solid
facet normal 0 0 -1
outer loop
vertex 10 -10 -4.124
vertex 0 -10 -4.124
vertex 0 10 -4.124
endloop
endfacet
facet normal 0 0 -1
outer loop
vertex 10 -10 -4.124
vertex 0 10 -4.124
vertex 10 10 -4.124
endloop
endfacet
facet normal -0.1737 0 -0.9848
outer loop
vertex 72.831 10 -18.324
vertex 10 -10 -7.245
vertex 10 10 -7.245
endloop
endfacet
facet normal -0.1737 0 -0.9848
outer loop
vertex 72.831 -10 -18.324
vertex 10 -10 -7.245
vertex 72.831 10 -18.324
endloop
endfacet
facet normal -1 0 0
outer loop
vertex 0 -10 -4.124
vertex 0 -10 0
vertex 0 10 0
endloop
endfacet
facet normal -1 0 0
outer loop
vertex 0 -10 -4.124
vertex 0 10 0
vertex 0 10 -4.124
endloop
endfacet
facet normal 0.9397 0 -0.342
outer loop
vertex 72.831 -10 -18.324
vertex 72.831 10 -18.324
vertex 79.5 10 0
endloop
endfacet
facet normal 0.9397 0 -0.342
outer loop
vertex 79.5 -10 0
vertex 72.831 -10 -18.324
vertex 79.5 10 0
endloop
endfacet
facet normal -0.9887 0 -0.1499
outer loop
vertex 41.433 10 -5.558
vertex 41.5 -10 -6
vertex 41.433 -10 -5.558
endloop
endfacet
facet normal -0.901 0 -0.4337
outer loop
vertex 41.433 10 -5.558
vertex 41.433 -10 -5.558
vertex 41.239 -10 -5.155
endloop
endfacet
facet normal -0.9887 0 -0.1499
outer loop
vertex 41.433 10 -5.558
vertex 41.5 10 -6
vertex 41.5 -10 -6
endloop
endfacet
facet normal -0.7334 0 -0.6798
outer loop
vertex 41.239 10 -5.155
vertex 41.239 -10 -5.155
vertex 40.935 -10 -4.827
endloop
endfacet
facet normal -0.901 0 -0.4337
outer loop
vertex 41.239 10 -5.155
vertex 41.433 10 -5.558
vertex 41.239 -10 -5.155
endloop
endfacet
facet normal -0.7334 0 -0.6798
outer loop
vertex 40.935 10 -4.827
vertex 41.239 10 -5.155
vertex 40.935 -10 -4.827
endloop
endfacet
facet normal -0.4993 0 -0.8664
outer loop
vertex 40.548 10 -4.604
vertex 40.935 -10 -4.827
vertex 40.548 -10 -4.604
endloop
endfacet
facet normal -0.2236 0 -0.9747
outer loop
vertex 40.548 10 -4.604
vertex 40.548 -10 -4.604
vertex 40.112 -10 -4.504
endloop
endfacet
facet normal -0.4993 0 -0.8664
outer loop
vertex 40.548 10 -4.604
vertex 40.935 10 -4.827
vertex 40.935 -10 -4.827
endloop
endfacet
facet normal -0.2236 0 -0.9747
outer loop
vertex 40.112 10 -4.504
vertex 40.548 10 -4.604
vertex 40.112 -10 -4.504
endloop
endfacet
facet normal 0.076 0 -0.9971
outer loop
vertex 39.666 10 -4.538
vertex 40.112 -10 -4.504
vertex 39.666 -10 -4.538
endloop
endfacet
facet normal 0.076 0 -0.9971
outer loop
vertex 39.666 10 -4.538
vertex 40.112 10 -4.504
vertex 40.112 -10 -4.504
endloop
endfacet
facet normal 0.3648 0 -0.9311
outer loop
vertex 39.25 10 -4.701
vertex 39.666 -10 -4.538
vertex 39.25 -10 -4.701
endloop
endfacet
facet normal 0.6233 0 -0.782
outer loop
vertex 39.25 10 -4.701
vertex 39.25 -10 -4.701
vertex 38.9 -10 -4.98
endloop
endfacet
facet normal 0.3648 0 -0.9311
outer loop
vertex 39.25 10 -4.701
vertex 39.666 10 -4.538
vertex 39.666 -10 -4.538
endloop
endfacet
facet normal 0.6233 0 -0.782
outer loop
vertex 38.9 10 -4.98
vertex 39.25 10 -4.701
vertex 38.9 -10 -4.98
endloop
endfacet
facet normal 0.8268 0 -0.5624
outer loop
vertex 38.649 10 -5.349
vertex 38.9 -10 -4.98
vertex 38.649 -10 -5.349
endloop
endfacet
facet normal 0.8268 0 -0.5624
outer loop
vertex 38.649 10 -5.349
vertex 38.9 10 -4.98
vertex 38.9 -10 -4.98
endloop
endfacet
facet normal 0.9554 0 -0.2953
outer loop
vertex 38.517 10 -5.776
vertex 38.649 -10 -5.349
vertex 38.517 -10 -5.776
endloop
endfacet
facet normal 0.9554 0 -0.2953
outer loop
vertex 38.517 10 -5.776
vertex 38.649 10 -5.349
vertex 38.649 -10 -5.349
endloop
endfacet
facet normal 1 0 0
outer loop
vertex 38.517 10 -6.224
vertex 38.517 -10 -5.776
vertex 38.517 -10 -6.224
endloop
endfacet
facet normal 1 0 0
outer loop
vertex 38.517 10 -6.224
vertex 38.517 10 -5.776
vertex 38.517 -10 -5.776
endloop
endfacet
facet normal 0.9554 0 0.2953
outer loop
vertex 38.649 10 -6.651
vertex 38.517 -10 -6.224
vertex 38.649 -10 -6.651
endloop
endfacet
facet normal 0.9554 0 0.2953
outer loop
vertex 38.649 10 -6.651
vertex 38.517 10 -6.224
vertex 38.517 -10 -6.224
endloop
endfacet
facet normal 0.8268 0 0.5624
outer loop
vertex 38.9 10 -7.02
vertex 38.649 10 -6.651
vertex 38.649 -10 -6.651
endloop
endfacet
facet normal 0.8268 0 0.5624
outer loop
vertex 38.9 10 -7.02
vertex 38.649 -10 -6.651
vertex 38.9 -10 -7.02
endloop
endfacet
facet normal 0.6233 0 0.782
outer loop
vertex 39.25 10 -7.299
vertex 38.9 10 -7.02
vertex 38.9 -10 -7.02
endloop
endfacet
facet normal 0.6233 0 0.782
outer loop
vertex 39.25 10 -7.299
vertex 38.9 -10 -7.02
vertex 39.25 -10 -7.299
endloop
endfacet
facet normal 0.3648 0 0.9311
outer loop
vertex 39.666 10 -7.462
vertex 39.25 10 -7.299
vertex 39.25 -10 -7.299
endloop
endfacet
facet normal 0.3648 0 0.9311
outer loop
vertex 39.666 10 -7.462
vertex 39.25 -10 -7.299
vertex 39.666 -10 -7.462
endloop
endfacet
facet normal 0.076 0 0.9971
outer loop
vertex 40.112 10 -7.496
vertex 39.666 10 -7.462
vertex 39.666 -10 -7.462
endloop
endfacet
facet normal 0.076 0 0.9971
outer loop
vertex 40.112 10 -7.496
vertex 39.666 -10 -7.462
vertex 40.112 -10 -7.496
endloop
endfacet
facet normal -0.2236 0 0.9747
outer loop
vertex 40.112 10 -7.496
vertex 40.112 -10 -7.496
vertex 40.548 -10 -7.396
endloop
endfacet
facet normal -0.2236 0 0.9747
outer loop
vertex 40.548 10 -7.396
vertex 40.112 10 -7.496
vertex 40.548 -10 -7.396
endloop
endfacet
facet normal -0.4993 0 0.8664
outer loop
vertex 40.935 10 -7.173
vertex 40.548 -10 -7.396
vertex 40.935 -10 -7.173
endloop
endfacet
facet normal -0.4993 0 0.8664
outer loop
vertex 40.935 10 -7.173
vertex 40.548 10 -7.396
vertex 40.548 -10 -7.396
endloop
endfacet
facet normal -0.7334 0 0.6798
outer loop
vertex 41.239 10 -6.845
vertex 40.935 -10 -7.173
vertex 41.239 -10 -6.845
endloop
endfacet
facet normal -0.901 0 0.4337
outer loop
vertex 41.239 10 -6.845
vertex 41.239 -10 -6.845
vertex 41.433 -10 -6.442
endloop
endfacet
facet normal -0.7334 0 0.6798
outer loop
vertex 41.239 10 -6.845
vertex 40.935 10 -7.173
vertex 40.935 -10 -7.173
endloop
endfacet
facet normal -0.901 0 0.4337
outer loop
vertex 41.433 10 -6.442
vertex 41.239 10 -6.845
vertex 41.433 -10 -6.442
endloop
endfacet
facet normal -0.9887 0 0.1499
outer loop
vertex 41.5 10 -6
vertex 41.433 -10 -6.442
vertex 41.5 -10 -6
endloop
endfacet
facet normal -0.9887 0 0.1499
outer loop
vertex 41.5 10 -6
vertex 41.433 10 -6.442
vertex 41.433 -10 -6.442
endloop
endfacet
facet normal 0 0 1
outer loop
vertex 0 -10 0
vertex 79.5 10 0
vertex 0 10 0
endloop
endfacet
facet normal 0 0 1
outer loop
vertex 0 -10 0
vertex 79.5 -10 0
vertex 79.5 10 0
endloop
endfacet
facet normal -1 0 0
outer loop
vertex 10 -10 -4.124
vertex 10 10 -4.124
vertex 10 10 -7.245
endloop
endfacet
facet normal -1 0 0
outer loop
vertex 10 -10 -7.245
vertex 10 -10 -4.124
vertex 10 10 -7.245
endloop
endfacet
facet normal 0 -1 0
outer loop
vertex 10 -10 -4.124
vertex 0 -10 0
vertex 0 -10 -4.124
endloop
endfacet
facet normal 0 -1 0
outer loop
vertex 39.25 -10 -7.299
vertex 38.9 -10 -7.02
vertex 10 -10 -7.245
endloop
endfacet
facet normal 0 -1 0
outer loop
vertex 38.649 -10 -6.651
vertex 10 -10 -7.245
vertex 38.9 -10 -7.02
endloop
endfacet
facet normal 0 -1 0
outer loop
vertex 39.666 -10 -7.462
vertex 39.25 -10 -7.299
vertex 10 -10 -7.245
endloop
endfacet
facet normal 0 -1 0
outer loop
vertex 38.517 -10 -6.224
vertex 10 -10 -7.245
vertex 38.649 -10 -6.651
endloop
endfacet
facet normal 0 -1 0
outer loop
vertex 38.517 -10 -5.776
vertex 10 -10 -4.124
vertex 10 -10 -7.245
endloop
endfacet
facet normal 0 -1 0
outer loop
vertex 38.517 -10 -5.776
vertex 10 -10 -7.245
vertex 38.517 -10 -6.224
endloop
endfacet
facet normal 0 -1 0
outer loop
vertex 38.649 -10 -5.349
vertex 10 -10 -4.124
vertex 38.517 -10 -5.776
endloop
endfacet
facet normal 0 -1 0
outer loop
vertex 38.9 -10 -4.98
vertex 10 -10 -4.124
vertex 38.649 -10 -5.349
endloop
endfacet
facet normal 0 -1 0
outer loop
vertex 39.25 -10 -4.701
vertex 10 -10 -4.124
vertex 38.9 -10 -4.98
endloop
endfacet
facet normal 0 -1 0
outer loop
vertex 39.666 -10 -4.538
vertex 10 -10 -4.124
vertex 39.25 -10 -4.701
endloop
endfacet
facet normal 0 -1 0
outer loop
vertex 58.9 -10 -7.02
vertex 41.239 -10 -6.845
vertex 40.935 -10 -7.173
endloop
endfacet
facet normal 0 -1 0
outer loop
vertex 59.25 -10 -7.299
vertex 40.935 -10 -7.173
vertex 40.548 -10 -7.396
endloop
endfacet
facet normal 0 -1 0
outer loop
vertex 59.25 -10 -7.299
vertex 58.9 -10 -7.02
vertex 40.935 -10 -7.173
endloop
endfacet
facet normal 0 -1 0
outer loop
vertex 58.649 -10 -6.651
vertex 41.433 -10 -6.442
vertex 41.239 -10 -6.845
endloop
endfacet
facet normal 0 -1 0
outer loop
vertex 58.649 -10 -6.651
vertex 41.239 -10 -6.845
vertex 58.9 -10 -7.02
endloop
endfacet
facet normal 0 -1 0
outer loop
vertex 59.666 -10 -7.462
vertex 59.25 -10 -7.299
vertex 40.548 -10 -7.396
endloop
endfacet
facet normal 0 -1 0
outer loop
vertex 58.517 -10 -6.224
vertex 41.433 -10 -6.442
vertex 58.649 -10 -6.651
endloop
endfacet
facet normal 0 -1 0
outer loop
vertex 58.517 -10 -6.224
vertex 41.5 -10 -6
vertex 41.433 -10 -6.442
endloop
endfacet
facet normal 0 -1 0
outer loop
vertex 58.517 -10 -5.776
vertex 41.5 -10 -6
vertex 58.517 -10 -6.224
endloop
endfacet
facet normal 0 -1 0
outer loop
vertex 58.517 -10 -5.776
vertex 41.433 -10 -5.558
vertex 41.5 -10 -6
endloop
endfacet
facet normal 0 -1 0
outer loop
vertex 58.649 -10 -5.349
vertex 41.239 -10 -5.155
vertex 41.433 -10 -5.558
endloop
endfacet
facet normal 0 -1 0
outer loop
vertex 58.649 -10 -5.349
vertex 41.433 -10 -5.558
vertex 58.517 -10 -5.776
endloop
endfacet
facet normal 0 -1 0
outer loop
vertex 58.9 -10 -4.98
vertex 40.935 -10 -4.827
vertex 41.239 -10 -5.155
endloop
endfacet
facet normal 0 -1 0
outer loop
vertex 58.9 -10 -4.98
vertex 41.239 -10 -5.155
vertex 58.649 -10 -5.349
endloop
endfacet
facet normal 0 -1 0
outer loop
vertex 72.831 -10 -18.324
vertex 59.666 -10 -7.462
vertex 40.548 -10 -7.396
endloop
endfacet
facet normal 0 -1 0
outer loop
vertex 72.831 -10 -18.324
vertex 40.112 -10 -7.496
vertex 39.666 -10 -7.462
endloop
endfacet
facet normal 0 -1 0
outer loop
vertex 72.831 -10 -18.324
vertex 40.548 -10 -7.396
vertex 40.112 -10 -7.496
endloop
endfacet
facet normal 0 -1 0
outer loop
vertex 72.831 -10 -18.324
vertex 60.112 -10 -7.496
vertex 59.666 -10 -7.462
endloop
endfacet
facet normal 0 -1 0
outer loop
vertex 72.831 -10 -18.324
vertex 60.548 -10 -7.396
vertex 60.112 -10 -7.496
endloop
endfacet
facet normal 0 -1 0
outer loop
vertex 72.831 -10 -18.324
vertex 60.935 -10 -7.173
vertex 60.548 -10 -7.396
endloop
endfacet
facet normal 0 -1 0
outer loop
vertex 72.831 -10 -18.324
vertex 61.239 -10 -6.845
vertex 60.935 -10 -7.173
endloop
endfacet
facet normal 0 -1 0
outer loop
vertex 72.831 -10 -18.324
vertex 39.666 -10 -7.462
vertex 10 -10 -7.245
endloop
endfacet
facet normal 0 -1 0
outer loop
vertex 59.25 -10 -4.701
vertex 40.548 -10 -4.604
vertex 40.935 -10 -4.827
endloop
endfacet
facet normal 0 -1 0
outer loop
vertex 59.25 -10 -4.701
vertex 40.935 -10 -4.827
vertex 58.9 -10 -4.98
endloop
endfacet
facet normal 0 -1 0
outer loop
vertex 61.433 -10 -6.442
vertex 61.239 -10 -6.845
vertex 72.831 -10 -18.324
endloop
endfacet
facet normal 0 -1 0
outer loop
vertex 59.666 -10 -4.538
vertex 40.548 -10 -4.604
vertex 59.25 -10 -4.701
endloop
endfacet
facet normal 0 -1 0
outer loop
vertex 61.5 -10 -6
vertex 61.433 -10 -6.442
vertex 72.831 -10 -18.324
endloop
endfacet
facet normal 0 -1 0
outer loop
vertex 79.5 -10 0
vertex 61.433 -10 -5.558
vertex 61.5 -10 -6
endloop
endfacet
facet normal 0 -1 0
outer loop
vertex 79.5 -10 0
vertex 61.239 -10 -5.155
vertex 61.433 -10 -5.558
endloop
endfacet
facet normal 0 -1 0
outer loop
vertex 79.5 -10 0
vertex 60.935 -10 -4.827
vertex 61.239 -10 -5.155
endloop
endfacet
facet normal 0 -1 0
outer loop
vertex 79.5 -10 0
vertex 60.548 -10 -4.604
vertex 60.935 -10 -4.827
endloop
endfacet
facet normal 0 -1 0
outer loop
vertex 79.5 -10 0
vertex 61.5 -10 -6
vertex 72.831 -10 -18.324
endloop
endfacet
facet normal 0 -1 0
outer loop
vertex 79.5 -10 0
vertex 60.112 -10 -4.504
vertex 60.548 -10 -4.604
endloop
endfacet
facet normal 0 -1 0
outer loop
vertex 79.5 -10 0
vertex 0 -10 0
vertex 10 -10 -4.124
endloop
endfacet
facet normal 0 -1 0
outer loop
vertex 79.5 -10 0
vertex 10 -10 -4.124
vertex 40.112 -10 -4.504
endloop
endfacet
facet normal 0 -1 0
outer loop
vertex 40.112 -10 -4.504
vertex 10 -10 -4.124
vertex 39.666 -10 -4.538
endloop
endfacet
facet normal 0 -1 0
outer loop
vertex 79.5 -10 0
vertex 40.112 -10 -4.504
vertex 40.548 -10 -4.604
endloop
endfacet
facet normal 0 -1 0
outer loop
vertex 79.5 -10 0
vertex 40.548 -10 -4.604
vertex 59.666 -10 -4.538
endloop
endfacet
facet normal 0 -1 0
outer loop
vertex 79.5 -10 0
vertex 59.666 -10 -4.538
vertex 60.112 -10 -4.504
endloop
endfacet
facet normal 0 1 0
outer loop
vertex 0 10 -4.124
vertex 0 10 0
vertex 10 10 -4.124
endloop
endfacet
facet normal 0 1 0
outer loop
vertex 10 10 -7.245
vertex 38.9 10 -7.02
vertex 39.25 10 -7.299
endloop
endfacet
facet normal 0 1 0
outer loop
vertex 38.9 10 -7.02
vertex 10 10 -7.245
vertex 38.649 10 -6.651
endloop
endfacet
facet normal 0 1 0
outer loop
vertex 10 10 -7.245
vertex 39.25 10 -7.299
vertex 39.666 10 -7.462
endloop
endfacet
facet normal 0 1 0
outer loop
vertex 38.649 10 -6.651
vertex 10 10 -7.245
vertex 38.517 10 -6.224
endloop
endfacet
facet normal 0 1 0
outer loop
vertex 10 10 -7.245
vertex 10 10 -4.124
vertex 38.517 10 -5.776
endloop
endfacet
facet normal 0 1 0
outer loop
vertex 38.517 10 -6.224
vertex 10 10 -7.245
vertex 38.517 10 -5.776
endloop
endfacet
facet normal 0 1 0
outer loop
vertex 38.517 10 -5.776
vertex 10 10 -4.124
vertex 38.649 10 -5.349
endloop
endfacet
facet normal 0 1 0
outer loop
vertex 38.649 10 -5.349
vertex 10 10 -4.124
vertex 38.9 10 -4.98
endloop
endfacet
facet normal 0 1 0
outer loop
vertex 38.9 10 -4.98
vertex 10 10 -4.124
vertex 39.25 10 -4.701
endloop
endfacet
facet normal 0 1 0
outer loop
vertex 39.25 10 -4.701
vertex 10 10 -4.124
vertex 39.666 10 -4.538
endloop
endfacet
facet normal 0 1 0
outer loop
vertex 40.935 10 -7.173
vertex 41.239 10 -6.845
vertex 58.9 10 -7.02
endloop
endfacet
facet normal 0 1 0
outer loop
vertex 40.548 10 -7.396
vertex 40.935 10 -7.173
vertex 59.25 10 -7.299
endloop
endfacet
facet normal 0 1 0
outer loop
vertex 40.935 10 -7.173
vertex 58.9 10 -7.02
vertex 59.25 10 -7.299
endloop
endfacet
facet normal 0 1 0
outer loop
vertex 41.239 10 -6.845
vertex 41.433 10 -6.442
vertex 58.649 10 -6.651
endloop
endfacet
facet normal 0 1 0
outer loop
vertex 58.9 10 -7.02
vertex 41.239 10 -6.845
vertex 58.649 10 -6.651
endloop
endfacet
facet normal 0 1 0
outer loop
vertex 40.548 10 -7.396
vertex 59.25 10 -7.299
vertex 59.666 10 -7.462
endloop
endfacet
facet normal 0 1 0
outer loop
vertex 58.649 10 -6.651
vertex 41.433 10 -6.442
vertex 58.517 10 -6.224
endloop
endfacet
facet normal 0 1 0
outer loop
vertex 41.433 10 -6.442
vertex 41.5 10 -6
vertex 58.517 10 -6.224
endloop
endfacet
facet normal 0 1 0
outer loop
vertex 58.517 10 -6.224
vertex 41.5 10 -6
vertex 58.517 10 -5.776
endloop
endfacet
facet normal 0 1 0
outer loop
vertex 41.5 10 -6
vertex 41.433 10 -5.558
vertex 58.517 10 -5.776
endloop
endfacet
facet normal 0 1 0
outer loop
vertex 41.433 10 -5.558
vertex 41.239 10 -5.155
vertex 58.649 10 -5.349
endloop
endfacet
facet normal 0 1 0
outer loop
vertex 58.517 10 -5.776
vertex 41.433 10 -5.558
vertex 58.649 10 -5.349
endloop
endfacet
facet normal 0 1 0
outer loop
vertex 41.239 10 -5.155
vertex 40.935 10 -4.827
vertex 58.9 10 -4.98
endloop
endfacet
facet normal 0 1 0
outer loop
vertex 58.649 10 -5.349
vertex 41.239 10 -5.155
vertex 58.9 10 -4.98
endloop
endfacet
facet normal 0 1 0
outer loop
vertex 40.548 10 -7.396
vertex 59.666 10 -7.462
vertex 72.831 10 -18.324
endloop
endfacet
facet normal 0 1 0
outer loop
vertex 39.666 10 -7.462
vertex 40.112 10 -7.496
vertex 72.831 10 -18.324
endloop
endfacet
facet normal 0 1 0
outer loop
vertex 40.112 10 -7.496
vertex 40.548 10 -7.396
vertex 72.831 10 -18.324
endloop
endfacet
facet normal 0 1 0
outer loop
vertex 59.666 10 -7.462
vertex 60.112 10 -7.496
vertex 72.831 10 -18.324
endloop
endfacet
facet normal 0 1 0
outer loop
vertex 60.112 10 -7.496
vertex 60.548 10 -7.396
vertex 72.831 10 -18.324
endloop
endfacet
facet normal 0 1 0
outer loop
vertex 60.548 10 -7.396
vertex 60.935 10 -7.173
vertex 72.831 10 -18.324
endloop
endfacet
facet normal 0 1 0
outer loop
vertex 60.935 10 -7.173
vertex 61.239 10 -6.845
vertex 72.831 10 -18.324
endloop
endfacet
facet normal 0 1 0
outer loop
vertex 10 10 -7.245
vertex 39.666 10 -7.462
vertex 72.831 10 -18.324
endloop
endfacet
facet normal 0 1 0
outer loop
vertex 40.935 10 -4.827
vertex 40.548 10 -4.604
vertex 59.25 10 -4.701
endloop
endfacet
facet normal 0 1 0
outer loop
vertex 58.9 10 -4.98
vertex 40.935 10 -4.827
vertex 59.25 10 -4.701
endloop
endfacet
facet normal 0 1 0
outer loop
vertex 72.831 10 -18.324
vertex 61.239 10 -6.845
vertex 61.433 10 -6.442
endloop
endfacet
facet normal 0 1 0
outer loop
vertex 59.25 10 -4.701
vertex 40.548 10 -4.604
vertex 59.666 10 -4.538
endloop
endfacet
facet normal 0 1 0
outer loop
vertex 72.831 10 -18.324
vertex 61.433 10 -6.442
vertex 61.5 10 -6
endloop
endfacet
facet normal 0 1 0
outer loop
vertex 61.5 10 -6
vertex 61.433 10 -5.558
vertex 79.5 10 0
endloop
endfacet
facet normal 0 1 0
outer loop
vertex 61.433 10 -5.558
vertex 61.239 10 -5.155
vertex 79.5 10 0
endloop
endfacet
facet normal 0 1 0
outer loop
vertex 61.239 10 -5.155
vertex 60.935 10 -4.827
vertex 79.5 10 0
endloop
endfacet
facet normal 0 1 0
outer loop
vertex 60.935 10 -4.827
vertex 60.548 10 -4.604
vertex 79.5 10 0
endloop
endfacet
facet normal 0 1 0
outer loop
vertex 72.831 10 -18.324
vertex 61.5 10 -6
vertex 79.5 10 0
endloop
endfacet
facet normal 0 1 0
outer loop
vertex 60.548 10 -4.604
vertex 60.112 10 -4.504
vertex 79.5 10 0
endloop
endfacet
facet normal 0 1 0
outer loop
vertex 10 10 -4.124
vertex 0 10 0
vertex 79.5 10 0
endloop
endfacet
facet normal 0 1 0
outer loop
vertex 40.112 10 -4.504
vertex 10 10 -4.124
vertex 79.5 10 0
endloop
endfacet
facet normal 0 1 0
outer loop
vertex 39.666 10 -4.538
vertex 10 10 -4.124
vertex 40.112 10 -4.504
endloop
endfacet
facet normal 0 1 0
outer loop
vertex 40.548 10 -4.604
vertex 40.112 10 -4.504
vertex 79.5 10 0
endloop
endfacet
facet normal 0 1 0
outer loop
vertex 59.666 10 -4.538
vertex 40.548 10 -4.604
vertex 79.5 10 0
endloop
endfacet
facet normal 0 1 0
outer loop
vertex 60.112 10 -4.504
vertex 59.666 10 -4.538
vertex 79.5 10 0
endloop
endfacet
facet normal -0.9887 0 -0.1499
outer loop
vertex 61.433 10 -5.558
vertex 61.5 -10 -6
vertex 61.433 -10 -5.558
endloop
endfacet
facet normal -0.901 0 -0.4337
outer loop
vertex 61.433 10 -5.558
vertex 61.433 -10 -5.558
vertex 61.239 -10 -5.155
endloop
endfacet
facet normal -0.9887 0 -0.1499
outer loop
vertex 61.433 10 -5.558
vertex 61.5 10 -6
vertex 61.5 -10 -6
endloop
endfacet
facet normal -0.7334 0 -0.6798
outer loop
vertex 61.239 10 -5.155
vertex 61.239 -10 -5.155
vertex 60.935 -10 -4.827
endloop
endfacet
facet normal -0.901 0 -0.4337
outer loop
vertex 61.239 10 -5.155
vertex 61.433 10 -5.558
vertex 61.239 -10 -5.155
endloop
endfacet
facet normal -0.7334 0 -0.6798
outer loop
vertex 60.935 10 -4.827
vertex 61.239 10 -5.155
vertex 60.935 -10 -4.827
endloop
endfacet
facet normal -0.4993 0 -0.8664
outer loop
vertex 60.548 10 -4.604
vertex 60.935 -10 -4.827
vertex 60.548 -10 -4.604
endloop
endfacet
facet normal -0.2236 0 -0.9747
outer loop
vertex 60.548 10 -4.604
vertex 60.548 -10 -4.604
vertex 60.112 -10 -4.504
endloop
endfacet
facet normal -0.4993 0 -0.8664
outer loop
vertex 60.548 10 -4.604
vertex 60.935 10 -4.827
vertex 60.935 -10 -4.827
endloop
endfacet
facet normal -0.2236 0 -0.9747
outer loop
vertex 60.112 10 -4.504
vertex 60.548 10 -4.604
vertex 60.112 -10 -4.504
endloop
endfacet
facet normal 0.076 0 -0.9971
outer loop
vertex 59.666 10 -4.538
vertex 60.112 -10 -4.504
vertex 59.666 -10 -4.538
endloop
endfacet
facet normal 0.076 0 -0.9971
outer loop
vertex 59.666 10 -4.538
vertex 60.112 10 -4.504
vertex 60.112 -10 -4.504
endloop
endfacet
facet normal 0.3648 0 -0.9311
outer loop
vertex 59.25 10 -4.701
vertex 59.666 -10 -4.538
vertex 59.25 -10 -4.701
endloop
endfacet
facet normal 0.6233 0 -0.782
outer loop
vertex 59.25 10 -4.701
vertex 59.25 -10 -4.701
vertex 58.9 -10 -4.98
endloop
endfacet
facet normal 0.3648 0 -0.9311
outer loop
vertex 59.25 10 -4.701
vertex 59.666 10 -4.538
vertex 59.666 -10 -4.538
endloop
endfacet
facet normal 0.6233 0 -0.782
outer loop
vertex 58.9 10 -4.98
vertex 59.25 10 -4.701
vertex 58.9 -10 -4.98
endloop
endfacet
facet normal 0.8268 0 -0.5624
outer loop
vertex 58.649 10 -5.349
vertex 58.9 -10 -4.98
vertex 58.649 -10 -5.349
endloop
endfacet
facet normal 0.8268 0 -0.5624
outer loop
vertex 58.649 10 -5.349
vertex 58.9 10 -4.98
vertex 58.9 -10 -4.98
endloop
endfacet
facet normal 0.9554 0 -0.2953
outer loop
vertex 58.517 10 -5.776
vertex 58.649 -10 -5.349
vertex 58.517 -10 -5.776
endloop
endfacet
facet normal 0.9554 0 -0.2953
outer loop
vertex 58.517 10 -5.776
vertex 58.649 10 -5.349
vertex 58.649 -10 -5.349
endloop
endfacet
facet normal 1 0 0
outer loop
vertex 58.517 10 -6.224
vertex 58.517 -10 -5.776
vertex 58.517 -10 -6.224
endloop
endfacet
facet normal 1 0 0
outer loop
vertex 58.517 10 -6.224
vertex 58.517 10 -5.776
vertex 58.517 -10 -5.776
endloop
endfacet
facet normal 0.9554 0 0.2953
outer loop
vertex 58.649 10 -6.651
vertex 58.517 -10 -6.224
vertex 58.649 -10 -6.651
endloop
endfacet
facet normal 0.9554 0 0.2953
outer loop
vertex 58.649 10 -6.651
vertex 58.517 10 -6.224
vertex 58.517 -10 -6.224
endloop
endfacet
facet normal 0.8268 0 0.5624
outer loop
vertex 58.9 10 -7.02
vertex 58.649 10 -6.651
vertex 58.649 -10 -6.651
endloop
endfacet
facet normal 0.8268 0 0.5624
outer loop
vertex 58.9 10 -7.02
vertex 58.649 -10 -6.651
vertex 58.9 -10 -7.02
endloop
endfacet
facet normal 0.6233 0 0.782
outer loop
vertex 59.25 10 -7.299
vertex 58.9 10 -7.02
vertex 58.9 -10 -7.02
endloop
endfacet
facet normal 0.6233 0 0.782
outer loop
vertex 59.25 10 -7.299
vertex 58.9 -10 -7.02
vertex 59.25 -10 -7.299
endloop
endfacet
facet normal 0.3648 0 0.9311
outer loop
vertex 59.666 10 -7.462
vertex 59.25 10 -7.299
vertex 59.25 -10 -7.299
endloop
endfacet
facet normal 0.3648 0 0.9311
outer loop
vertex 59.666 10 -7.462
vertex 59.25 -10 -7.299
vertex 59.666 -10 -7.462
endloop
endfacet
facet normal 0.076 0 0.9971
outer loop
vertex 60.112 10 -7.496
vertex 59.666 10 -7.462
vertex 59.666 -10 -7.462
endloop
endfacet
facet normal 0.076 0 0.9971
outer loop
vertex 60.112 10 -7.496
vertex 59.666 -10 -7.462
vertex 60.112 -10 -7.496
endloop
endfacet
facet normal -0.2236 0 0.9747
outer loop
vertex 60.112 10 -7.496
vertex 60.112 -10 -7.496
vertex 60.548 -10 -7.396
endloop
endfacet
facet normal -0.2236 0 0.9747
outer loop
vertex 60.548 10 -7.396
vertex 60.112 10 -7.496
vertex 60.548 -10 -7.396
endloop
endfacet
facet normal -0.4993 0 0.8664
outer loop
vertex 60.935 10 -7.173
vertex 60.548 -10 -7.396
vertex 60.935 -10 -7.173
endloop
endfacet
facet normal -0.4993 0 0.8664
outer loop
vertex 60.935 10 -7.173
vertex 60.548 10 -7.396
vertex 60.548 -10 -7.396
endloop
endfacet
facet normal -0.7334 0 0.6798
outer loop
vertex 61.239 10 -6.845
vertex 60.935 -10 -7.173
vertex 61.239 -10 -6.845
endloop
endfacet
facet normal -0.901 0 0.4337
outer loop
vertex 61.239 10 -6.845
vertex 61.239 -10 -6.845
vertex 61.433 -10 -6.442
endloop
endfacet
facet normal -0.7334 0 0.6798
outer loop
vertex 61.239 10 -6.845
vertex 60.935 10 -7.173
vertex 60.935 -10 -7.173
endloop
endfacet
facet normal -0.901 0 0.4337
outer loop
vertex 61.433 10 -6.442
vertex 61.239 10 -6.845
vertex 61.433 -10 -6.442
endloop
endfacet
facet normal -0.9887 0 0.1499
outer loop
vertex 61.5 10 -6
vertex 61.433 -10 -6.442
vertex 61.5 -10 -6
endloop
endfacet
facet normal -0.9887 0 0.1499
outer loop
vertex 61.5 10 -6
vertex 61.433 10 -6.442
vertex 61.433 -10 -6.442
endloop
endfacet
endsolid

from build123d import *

# Parameters (mm, degrees)
F0_R     = 1.5
F1_DEPTH = 10


with BuildPart() as f1:
    # F0 (on Front) → F1 (new body, symmetric)
    with BuildSketch(Plane.XZ):
        Polygon((79.5, 0), (0, 0), (0, -4.123699), (10, -4.123699), (10, -7.245275), (72.830607, -18.324006), align=None)
        with Locations((40, -6)):
            Circle(F0_R, mode=Mode.SUBTRACT)
        with Locations((60, -6)):
            Circle(F0_R, mode=Mode.SUBTRACT)
    extrude(amount=F1_DEPTH, both=True)


solid = f1.part
